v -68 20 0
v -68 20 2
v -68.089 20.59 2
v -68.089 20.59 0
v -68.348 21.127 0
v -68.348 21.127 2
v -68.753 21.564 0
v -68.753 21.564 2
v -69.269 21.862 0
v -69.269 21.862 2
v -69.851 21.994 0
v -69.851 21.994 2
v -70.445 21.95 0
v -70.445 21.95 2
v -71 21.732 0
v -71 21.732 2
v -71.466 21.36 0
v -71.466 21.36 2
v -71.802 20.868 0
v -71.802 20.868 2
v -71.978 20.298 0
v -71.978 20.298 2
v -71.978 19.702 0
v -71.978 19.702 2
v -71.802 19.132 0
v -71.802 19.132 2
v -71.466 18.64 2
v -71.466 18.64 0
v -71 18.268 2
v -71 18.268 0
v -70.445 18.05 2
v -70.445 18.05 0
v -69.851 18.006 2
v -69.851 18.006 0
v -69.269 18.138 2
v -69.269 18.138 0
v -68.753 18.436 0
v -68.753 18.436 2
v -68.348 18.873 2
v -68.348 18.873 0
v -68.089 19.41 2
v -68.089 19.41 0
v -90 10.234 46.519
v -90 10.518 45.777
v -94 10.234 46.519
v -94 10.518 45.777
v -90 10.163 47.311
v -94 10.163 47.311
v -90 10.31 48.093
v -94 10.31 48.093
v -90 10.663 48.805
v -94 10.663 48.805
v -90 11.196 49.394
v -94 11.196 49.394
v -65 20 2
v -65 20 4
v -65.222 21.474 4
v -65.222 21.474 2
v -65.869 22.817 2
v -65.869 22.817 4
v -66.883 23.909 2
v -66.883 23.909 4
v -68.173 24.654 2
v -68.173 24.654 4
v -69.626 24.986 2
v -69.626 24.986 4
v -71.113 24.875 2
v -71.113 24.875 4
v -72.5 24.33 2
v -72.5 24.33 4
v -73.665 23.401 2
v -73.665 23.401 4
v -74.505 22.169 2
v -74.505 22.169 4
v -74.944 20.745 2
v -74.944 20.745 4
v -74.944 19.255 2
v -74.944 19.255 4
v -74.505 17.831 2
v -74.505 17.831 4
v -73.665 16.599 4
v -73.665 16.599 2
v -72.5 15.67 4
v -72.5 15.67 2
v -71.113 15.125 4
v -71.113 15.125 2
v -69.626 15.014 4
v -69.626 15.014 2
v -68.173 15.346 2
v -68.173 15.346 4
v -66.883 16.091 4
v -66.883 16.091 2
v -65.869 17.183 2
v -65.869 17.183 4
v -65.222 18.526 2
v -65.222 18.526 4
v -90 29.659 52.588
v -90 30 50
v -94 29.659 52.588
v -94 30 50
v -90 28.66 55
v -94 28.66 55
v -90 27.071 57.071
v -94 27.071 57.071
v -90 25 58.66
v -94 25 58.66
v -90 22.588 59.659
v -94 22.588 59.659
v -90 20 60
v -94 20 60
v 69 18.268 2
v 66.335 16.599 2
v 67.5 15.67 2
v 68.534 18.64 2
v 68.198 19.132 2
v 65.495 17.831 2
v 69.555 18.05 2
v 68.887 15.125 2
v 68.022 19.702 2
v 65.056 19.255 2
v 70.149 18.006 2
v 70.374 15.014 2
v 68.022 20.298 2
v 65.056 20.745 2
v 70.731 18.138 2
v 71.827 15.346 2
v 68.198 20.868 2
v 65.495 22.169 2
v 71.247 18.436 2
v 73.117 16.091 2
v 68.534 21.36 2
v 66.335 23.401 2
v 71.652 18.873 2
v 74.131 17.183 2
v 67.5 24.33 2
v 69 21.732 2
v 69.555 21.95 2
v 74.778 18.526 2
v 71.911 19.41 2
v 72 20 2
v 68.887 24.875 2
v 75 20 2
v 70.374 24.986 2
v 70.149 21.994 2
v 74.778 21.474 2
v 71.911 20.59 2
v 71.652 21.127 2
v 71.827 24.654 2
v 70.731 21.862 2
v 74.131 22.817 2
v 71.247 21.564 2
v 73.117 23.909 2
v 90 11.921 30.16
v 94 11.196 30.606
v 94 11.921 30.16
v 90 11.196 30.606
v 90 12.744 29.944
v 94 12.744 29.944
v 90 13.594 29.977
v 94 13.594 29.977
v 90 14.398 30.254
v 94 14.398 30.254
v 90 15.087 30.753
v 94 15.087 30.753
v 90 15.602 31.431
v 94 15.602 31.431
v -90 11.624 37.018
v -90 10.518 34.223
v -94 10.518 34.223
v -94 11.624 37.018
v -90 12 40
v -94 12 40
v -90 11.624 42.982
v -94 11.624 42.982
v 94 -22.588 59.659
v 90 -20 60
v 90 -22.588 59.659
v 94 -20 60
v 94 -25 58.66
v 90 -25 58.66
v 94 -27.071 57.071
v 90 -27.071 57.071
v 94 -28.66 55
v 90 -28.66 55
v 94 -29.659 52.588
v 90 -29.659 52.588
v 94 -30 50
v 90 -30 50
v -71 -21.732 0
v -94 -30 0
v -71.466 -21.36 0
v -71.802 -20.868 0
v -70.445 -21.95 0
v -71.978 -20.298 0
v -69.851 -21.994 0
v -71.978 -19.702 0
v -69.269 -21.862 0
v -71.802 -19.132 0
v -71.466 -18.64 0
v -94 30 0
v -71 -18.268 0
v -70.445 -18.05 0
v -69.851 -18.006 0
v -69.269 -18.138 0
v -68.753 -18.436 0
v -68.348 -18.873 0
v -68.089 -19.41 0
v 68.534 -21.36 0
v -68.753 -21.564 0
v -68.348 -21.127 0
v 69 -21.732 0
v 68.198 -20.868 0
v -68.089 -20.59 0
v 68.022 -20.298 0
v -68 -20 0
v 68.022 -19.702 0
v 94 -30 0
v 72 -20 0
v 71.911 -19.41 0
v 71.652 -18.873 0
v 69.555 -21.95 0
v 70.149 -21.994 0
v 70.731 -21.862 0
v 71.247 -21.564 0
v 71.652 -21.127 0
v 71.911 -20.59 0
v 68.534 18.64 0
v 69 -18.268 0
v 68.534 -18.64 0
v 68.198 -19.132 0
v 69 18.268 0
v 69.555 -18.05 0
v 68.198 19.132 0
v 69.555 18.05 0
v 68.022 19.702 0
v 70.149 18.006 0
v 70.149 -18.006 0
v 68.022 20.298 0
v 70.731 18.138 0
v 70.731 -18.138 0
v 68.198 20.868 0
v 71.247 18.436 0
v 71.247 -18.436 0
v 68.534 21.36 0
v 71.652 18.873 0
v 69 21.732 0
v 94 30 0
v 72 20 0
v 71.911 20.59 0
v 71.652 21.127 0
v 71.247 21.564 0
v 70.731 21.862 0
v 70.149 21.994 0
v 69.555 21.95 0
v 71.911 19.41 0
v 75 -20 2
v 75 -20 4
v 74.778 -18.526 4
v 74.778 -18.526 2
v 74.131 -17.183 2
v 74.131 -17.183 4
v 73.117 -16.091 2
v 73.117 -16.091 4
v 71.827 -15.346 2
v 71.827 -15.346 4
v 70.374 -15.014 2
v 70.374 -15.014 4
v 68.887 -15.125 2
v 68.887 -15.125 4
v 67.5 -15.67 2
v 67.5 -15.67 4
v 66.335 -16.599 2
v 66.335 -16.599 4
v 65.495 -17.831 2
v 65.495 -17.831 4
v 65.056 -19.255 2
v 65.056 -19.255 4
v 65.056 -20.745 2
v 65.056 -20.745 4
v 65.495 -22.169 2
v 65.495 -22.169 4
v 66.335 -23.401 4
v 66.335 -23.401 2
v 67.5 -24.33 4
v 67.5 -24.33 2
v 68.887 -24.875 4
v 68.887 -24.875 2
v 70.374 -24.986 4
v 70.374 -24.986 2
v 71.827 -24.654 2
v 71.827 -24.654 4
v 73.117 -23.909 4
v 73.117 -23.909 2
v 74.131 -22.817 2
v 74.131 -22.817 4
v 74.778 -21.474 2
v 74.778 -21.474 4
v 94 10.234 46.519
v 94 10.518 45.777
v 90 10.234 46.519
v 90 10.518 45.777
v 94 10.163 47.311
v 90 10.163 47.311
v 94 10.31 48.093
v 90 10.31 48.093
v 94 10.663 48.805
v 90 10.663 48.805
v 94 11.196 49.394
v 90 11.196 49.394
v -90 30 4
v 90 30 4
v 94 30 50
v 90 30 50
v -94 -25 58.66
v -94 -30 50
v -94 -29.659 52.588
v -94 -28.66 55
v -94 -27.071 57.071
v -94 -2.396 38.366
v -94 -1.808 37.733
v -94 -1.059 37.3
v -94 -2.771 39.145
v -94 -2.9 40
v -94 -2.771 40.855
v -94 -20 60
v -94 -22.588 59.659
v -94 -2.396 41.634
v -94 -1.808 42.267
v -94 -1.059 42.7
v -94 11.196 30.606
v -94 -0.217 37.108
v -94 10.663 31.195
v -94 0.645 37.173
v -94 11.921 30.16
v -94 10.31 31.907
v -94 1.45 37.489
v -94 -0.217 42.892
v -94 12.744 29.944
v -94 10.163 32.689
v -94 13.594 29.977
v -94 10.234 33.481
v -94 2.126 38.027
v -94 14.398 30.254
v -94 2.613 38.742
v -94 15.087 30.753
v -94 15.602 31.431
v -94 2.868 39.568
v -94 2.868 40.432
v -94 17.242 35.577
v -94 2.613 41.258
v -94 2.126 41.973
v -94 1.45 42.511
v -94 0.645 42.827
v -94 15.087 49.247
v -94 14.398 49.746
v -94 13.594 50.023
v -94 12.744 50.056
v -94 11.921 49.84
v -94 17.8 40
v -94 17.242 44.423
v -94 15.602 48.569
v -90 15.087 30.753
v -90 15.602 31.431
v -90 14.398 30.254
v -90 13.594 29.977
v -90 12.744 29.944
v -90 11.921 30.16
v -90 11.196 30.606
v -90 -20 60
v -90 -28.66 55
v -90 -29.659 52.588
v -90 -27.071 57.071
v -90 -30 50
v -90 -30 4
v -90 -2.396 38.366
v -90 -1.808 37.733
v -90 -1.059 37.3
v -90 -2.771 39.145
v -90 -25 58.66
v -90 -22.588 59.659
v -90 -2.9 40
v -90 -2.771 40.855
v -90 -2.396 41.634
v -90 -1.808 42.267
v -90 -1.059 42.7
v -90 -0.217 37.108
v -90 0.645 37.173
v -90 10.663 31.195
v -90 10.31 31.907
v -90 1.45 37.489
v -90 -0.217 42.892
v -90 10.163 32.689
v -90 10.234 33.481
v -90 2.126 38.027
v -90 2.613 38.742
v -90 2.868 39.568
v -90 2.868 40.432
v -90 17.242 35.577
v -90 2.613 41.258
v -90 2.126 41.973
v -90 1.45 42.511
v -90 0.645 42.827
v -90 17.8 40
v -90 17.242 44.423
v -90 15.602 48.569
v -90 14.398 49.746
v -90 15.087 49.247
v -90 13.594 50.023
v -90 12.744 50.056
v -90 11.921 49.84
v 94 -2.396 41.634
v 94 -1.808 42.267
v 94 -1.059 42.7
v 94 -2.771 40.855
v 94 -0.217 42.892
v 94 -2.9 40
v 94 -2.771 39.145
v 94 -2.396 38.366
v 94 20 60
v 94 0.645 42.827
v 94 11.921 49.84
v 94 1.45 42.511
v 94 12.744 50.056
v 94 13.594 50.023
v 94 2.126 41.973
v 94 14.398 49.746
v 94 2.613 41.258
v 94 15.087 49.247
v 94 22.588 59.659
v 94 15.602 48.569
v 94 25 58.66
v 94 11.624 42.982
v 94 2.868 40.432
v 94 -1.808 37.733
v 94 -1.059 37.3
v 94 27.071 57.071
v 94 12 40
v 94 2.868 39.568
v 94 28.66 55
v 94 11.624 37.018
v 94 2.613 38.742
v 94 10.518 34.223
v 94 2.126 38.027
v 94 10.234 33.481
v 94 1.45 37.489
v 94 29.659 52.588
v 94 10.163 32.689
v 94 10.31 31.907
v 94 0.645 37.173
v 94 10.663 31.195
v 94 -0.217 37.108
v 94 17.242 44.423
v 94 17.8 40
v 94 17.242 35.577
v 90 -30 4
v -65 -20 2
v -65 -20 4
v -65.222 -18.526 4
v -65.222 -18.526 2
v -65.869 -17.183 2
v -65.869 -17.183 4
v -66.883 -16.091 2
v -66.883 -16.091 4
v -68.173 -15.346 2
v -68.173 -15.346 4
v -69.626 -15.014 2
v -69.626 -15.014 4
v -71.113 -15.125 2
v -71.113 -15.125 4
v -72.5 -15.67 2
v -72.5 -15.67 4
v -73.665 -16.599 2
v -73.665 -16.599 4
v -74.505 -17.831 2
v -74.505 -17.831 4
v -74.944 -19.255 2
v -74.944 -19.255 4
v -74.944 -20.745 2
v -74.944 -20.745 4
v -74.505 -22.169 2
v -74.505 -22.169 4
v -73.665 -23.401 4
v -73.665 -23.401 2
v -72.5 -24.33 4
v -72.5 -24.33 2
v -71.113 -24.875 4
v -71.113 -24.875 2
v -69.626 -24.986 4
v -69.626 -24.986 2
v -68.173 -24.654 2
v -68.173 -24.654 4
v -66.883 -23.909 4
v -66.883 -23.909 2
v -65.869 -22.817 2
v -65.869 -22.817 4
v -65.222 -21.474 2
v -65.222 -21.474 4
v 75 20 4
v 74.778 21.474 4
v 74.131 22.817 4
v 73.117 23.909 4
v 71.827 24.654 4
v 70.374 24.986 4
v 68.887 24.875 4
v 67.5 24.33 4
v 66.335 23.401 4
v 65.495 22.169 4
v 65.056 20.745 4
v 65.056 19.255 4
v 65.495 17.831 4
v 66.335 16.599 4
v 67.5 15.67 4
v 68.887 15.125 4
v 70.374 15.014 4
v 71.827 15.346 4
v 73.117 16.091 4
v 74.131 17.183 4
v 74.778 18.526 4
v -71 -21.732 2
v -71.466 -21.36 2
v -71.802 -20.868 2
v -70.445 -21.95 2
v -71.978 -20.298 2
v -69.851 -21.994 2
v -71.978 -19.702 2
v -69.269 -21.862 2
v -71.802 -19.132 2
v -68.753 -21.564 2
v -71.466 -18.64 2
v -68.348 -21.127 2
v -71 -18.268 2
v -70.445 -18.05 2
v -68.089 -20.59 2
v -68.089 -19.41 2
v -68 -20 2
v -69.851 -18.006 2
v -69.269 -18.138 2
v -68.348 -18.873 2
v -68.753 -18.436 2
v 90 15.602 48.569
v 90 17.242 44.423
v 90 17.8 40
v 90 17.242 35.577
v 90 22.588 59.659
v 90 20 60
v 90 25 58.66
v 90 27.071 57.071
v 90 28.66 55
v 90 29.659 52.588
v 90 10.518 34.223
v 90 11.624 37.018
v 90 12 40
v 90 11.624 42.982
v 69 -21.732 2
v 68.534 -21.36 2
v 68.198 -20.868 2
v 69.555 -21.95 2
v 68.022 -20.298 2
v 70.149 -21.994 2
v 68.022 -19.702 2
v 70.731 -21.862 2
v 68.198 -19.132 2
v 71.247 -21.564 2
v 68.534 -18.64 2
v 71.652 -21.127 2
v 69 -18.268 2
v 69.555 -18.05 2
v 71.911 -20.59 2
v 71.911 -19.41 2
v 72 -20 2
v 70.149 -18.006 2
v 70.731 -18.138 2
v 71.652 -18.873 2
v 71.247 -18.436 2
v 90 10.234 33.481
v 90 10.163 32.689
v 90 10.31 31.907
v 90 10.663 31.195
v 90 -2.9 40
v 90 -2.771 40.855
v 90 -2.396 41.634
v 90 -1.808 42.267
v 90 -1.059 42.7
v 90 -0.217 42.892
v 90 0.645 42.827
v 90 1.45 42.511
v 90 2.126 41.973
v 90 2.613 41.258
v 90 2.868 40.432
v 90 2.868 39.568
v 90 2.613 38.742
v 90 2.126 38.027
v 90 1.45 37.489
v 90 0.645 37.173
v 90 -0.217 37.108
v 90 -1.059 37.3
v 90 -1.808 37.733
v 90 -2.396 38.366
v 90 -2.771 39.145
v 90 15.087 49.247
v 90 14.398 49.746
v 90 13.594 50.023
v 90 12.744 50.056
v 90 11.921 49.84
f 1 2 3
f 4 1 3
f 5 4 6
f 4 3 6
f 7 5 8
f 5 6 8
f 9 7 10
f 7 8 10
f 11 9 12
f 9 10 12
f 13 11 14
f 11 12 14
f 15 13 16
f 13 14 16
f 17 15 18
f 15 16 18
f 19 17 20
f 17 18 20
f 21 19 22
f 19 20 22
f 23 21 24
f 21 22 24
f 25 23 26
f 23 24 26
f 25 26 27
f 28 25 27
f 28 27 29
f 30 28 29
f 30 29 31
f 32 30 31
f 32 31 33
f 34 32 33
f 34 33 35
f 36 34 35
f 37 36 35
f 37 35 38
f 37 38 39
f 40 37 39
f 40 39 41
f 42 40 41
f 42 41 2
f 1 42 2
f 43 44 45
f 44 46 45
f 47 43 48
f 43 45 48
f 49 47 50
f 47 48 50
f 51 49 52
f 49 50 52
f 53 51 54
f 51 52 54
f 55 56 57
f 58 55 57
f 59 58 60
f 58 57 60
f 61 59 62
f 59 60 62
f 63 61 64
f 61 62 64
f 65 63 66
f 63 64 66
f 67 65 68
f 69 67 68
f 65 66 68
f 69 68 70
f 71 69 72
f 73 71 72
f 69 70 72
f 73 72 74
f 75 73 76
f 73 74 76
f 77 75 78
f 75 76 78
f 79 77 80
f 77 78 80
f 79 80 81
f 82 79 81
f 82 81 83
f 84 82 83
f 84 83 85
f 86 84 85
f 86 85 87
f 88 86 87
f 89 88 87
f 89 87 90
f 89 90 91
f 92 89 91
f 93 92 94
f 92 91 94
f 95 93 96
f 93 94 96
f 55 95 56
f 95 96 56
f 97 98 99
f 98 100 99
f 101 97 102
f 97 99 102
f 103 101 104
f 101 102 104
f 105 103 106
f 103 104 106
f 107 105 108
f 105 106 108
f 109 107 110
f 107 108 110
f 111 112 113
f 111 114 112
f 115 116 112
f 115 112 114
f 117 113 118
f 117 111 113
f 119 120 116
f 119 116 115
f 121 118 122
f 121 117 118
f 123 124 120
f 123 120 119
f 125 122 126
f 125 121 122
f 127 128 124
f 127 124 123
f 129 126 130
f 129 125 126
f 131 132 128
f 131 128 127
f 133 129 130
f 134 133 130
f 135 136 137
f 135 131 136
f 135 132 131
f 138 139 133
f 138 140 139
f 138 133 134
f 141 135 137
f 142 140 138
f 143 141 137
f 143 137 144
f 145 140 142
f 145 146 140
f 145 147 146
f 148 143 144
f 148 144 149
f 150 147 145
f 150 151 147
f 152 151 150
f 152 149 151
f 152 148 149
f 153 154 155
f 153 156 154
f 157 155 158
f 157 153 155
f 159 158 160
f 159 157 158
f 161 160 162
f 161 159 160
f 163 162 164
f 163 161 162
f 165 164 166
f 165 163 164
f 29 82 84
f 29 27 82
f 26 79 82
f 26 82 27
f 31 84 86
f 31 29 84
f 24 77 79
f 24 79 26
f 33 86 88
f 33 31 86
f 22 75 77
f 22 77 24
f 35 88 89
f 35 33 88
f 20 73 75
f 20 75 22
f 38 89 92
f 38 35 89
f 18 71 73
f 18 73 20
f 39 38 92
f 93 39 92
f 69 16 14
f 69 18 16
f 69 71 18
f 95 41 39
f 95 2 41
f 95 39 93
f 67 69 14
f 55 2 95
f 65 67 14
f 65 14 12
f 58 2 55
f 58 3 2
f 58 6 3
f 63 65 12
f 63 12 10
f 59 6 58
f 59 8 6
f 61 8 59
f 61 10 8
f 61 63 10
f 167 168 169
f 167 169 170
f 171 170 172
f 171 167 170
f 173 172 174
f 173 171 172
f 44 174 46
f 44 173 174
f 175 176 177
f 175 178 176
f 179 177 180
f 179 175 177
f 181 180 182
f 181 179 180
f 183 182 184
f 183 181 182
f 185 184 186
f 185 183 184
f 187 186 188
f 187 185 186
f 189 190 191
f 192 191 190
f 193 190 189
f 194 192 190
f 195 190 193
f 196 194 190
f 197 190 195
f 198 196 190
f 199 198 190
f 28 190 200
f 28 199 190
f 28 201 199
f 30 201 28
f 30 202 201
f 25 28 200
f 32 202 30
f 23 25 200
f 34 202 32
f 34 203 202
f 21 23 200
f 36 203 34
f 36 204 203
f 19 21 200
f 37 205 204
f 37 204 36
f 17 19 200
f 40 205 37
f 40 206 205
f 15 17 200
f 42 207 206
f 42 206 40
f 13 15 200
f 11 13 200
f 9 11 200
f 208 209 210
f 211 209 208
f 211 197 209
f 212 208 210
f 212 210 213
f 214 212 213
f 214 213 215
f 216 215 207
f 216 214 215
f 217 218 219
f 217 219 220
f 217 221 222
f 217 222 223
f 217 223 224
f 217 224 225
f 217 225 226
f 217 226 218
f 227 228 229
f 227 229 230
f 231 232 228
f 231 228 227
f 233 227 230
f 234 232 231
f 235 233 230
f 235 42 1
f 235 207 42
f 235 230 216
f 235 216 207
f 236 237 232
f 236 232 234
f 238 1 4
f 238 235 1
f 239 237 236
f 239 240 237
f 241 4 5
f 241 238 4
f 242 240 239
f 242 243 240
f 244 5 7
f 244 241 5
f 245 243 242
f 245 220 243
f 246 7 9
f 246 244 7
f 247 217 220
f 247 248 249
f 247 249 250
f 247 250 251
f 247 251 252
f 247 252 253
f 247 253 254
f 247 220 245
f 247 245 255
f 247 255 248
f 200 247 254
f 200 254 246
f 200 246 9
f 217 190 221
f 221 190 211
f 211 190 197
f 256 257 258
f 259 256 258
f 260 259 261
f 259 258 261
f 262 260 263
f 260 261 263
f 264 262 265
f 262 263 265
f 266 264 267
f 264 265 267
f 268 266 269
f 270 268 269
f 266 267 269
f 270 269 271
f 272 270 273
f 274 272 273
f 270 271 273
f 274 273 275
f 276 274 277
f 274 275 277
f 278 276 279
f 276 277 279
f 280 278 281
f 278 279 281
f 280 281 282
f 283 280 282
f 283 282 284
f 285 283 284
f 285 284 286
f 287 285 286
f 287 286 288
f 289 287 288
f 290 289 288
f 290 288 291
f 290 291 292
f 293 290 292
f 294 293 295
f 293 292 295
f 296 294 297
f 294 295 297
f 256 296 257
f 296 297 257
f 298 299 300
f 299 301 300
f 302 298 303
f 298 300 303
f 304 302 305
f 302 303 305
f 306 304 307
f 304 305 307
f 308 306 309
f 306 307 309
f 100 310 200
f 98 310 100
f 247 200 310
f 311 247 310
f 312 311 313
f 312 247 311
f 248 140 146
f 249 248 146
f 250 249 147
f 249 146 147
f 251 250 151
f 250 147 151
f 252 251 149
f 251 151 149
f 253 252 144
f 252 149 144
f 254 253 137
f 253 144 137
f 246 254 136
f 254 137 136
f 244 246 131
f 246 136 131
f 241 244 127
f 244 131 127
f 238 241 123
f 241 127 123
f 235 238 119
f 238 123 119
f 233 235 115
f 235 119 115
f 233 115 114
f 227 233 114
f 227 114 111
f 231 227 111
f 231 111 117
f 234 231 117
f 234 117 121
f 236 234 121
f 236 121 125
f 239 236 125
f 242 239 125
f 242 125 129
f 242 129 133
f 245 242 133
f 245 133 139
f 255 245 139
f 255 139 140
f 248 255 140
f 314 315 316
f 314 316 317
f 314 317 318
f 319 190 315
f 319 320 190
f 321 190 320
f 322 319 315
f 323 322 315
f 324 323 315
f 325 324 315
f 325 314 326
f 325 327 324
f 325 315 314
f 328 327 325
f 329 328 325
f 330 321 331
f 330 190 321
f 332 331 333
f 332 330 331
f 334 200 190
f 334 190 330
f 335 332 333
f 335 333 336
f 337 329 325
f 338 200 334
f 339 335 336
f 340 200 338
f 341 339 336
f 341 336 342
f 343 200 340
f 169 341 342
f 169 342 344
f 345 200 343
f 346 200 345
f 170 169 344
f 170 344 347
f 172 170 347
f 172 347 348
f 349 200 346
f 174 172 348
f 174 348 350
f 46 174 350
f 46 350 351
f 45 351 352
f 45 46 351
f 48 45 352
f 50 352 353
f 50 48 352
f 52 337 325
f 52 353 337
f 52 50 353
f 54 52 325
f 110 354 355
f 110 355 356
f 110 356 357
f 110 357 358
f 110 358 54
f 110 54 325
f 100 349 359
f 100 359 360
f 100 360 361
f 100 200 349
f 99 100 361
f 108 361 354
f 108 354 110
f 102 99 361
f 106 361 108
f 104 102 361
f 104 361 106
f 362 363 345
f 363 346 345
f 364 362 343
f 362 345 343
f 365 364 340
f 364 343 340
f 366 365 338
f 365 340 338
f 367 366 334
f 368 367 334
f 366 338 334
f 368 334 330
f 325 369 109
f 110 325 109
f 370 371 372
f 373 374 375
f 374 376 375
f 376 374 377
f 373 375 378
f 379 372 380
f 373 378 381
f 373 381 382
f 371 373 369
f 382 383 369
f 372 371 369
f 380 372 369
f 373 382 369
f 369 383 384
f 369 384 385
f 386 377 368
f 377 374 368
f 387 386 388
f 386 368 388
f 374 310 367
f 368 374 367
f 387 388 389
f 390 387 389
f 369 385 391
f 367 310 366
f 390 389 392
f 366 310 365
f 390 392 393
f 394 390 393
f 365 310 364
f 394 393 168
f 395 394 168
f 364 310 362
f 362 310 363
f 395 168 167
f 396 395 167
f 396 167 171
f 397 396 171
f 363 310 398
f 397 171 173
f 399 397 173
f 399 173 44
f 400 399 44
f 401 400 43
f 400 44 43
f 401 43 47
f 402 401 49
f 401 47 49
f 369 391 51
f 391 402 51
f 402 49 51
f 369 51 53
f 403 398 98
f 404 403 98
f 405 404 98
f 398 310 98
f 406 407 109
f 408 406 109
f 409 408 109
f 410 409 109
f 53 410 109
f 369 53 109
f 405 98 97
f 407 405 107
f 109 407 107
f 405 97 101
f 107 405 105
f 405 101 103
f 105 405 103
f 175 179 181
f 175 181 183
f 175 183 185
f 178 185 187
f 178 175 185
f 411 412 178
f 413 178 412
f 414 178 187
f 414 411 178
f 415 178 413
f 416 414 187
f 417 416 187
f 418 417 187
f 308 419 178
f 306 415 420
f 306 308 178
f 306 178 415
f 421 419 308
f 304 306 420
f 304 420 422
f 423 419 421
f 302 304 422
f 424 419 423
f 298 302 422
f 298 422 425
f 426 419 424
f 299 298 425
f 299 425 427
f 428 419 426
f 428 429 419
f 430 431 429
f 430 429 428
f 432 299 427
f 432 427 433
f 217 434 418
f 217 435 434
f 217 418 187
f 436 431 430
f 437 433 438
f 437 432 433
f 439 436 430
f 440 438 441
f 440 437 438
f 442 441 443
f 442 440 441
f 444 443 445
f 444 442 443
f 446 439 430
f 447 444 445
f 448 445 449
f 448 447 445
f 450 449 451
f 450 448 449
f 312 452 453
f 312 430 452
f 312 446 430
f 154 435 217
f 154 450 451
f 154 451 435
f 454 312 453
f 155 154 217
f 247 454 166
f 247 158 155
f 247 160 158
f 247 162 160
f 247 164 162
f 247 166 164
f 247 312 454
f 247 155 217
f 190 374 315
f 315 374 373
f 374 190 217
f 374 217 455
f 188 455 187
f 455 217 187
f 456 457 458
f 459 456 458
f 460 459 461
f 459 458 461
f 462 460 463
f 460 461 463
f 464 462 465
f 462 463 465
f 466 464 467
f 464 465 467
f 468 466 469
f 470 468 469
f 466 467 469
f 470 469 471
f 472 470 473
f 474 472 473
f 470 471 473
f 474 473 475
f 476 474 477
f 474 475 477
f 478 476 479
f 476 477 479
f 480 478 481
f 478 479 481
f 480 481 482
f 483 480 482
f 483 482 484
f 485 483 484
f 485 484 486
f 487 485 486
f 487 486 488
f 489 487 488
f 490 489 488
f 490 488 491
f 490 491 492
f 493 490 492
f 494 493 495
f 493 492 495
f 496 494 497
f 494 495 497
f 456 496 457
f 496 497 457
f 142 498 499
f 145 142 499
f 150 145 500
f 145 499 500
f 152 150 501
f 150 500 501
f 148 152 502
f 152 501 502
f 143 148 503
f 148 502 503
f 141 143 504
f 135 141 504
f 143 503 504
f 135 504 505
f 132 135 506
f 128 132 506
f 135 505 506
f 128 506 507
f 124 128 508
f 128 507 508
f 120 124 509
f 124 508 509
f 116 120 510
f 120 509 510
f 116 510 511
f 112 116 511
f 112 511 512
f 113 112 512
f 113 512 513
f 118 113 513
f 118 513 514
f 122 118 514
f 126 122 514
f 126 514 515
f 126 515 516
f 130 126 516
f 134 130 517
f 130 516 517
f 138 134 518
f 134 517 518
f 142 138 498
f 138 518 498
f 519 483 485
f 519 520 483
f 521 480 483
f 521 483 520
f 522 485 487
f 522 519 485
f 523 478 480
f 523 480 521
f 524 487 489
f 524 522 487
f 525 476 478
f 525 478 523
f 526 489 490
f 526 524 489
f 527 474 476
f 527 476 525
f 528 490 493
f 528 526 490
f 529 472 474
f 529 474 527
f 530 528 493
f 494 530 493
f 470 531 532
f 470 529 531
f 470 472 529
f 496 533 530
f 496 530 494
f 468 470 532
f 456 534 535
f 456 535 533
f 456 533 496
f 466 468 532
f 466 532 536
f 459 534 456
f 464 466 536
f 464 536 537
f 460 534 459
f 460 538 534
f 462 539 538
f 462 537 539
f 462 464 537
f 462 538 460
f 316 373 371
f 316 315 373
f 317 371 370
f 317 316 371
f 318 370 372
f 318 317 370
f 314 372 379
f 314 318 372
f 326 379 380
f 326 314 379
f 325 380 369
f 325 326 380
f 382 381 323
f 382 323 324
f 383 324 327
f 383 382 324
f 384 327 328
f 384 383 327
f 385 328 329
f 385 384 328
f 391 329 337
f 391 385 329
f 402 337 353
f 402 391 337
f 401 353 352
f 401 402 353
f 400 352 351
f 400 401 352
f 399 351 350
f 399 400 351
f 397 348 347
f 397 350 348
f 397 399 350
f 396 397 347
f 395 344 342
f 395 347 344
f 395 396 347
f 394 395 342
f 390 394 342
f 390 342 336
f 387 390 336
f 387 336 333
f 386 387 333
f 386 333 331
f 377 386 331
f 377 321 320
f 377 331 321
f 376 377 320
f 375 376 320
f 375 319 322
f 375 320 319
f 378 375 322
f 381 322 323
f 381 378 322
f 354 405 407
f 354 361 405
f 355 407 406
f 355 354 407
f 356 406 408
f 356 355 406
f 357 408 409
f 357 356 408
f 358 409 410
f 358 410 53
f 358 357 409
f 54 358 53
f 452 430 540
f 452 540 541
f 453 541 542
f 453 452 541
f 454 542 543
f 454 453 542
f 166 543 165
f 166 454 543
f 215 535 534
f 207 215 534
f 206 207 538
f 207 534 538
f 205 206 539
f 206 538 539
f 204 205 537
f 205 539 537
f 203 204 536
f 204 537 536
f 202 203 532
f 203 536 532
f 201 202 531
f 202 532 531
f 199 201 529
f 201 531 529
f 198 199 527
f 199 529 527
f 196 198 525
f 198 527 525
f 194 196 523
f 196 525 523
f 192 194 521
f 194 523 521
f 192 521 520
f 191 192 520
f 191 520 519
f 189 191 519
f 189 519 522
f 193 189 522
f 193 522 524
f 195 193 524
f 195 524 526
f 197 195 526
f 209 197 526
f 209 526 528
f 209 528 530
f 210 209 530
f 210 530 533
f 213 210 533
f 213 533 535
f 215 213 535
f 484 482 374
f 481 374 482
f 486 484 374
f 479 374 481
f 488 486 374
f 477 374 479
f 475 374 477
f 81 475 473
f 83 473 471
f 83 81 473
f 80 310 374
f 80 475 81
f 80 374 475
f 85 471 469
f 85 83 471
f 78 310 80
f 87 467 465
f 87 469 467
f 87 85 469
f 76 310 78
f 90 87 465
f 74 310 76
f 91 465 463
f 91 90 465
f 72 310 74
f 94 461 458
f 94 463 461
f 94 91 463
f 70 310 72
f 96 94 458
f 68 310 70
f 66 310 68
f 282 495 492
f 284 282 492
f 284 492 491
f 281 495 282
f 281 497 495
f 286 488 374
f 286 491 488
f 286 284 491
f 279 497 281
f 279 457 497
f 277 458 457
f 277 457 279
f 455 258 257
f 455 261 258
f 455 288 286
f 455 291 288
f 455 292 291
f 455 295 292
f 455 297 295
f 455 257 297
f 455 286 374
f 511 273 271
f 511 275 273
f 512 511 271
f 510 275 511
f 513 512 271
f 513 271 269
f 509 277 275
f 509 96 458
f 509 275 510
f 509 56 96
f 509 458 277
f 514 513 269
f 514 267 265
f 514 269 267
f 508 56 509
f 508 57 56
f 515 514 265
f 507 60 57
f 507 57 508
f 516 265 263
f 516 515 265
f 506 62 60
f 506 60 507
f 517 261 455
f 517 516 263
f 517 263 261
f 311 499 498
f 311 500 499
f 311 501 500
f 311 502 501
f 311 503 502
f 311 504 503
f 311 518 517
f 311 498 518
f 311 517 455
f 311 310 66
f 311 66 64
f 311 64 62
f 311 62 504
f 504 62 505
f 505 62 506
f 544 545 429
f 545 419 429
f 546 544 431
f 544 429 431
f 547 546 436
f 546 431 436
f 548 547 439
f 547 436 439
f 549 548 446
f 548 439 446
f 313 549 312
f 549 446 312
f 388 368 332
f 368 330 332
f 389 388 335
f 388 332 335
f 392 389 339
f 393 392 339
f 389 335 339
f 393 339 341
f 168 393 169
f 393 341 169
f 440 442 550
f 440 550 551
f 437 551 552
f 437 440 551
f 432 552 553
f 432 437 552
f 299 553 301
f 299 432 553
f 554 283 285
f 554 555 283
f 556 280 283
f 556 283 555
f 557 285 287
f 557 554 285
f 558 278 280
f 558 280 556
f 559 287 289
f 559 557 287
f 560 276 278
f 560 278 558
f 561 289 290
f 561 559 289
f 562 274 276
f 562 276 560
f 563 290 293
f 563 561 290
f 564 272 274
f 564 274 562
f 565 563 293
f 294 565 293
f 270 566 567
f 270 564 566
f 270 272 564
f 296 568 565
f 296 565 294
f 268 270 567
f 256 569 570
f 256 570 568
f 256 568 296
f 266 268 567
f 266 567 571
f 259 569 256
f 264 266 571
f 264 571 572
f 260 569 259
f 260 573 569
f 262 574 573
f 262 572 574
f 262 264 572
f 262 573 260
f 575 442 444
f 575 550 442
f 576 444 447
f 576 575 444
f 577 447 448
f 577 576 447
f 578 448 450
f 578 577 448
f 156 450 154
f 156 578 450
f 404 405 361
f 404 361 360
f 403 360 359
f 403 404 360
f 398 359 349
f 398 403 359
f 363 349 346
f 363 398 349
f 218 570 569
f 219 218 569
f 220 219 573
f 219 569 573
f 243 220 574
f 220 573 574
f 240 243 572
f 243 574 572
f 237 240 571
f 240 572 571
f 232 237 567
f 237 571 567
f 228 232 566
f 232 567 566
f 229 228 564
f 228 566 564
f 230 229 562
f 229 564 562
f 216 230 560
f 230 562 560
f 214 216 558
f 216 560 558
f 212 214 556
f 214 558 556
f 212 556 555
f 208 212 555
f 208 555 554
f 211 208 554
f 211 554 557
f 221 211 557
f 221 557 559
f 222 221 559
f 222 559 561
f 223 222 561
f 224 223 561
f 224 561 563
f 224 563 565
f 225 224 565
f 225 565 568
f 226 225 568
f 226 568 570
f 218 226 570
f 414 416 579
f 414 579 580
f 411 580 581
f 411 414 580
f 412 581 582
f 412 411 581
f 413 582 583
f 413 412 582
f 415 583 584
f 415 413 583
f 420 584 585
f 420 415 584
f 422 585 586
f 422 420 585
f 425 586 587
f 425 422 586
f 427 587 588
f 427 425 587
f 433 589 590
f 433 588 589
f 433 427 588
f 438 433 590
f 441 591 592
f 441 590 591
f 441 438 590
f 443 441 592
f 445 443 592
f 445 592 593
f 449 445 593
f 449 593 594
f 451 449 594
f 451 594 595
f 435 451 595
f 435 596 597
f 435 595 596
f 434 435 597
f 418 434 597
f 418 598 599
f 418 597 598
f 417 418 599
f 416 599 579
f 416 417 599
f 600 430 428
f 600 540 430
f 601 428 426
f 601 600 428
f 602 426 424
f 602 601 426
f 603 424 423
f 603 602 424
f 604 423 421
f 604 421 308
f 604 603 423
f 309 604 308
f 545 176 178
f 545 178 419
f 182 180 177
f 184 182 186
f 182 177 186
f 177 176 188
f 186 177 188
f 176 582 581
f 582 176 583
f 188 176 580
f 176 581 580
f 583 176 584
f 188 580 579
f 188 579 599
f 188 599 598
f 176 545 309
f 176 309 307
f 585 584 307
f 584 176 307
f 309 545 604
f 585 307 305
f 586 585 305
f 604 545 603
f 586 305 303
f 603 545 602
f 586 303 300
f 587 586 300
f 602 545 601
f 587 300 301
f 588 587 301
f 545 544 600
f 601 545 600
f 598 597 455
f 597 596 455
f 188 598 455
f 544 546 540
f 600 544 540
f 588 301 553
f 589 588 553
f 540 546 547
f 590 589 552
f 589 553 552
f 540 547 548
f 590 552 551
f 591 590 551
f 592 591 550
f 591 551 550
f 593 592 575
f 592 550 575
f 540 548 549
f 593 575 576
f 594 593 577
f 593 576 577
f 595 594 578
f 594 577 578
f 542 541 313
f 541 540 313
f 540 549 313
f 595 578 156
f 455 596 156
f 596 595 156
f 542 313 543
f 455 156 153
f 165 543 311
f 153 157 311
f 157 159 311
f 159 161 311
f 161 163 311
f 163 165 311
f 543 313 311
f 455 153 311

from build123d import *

# Parameters (mm, degrees)
SKETCH_1_W               = 180
SKETCH_1_H               = 60
EXTRUDE_1_DEPTH          = 4
SKETCH_4_R               = 2
CUT_EXTRUDE_2_DEPTH      = 50
SKETCH_8_R               = 5
CUT_EXTRUDE_6_DEPTH      = 2
SKETCH_9_W               = 60
SKETCH_9_H               = 60
EXTRUDE_2_DEPTH          = 4
SKETCH_10_W              = 60
SKETCH_10_H              = 60
EXTRUDE_3_DEPTH          = 4
CUT_EXTRUDE_7_DEPTH      = 200.609619007
CUT_EXTRUDE_7_DEPTH_BACK = 200.609619007
SKETCH_11_R              = 2.9
FILLET_1_R               = 2.9
FILLET_2_R               = 2.9
FILLET_3_R               = 10


with BuildPart() as part:
    # 草图1 → 凸台-拉伸1 (new body)
    with BuildSketch(Plane.XY):
        Rectangle(SKETCH_1_W, SKETCH_1_H)
    extrude(amount=EXTRUDE_1_DEPTH)

    # 草图4 → 切除-拉伸2 (cut)
    with BuildSketch(Plane.XY.offset(4)):
        with Locations((-70, 20)):
            Circle(SKETCH_4_R)
        with Locations((-70, -20)):
            Circle(SKETCH_4_R)
        with Locations((70, 20)):
            Circle(SKETCH_4_R)
        with Locations((70, -20)):
            Circle(SKETCH_4_R)
    extrude(amount=-CUT_EXTRUDE_2_DEPTH, mode=Mode.SUBTRACT)

    # 草图8 → 切除-拉伸6 (cut)
    with BuildSketch(Plane.XY.offset(4)):
        with Locations((70, 20)):
            Circle(SKETCH_8_R)
        with Locations((-70, 20)):
            Circle(SKETCH_8_R)
        with Locations((-70, -20)):
            Circle(SKETCH_8_R)
        with Locations((70, -20)):
            Circle(SKETCH_8_R)
    extrude(amount=-CUT_EXTRUDE_6_DEPTH, mode=Mode.SUBTRACT)

    # 草图9 → 凸台-拉伸2 (add)
    with BuildSketch(Plane(origin=(90, 0, 0), x_dir=(0, 0, -1), z_dir=(1, 0, 0))):
        with Locations((-30, 0)):
            Rectangle(SKETCH_9_W, SKETCH_9_H)
    extrude(amount=EXTRUDE_2_DEPTH)

    # 草图10 → 凸台-拉伸3 (add)
    with BuildSketch(Plane.ZY.offset(90)):
        with Locations((30, 0)):
            Rectangle(SKETCH_10_W, SKETCH_10_H)
    extrude(amount=EXTRUDE_3_DEPTH)

    # 草图11 → 切除-拉伸7 (cut, two sides: drawn at the far end of the back side and taken through both)
    with BuildSketch(Plane.ZY.offset(94).offset(-CUT_EXTRUDE_7_DEPTH_BACK)):
        with Locations(Location((40, 0, 0), (0, 0, 270))):
            Circle(SKETCH_11_R)
        with BuildLine():
            Line((47.713451316, 9.192533317), (51.441619452, 13.635591088))
            ThreePointArc((51.441619452, 13.635591088), (40, 17.8), (28.558380548, 13.635591088))
            Line((28.558380548, 13.635591088), (32.286548684, 9.192533317))
            ThreePointArc((32.286548684, 9.192533317), (40, 12), (47.713451316, 9.192533317))
        make_face()
    extrude(amount=CUT_EXTRUDE_7_DEPTH + CUT_EXTRUDE_7_DEPTH_BACK, mode=Mode.SUBTRACT)

    # 圆角1
    fillet_1_edges = [part.edges().sort_by_distance(p)[0] for p in [
        (-92, 13.635591088, 51.441619452),
        (-92, 9.192533317, 47.713451316),
        (-92, 13.635591088, 28.558380548),
        (-92, 9.192533317, 32.286548684),
    ]]
    fillet(fillet_1_edges, radius=FILLET_1_R - 0.0001)  # a hair under: the kernel refuses the full size

    # 圆角2
    fillet_2_edges = [part.edges().sort_by_distance(p)[0] for p in [
        (92, 13.635591088, 28.558380548),
        (92, 13.635591088, 51.441619452),
        (92, 9.192533317, 47.713451316),
        (92, 9.192533317, 32.286548684),
    ]]
    fillet(fillet_2_edges, radius=FILLET_2_R - 0.0001)  # a hair under: the kernel refuses the full size

    # 圆角3
    fillet_3_edges = [part.edges().sort_by_distance(p)[0] for p in [
        (92, 30, 60),
        (92, -30, 60),
        (-92, -30, 60),
        (-92, 30, 60),
    ]]
    fillet(fillet_3_edges, radius=FILLET_3_R)


solid = part.part
